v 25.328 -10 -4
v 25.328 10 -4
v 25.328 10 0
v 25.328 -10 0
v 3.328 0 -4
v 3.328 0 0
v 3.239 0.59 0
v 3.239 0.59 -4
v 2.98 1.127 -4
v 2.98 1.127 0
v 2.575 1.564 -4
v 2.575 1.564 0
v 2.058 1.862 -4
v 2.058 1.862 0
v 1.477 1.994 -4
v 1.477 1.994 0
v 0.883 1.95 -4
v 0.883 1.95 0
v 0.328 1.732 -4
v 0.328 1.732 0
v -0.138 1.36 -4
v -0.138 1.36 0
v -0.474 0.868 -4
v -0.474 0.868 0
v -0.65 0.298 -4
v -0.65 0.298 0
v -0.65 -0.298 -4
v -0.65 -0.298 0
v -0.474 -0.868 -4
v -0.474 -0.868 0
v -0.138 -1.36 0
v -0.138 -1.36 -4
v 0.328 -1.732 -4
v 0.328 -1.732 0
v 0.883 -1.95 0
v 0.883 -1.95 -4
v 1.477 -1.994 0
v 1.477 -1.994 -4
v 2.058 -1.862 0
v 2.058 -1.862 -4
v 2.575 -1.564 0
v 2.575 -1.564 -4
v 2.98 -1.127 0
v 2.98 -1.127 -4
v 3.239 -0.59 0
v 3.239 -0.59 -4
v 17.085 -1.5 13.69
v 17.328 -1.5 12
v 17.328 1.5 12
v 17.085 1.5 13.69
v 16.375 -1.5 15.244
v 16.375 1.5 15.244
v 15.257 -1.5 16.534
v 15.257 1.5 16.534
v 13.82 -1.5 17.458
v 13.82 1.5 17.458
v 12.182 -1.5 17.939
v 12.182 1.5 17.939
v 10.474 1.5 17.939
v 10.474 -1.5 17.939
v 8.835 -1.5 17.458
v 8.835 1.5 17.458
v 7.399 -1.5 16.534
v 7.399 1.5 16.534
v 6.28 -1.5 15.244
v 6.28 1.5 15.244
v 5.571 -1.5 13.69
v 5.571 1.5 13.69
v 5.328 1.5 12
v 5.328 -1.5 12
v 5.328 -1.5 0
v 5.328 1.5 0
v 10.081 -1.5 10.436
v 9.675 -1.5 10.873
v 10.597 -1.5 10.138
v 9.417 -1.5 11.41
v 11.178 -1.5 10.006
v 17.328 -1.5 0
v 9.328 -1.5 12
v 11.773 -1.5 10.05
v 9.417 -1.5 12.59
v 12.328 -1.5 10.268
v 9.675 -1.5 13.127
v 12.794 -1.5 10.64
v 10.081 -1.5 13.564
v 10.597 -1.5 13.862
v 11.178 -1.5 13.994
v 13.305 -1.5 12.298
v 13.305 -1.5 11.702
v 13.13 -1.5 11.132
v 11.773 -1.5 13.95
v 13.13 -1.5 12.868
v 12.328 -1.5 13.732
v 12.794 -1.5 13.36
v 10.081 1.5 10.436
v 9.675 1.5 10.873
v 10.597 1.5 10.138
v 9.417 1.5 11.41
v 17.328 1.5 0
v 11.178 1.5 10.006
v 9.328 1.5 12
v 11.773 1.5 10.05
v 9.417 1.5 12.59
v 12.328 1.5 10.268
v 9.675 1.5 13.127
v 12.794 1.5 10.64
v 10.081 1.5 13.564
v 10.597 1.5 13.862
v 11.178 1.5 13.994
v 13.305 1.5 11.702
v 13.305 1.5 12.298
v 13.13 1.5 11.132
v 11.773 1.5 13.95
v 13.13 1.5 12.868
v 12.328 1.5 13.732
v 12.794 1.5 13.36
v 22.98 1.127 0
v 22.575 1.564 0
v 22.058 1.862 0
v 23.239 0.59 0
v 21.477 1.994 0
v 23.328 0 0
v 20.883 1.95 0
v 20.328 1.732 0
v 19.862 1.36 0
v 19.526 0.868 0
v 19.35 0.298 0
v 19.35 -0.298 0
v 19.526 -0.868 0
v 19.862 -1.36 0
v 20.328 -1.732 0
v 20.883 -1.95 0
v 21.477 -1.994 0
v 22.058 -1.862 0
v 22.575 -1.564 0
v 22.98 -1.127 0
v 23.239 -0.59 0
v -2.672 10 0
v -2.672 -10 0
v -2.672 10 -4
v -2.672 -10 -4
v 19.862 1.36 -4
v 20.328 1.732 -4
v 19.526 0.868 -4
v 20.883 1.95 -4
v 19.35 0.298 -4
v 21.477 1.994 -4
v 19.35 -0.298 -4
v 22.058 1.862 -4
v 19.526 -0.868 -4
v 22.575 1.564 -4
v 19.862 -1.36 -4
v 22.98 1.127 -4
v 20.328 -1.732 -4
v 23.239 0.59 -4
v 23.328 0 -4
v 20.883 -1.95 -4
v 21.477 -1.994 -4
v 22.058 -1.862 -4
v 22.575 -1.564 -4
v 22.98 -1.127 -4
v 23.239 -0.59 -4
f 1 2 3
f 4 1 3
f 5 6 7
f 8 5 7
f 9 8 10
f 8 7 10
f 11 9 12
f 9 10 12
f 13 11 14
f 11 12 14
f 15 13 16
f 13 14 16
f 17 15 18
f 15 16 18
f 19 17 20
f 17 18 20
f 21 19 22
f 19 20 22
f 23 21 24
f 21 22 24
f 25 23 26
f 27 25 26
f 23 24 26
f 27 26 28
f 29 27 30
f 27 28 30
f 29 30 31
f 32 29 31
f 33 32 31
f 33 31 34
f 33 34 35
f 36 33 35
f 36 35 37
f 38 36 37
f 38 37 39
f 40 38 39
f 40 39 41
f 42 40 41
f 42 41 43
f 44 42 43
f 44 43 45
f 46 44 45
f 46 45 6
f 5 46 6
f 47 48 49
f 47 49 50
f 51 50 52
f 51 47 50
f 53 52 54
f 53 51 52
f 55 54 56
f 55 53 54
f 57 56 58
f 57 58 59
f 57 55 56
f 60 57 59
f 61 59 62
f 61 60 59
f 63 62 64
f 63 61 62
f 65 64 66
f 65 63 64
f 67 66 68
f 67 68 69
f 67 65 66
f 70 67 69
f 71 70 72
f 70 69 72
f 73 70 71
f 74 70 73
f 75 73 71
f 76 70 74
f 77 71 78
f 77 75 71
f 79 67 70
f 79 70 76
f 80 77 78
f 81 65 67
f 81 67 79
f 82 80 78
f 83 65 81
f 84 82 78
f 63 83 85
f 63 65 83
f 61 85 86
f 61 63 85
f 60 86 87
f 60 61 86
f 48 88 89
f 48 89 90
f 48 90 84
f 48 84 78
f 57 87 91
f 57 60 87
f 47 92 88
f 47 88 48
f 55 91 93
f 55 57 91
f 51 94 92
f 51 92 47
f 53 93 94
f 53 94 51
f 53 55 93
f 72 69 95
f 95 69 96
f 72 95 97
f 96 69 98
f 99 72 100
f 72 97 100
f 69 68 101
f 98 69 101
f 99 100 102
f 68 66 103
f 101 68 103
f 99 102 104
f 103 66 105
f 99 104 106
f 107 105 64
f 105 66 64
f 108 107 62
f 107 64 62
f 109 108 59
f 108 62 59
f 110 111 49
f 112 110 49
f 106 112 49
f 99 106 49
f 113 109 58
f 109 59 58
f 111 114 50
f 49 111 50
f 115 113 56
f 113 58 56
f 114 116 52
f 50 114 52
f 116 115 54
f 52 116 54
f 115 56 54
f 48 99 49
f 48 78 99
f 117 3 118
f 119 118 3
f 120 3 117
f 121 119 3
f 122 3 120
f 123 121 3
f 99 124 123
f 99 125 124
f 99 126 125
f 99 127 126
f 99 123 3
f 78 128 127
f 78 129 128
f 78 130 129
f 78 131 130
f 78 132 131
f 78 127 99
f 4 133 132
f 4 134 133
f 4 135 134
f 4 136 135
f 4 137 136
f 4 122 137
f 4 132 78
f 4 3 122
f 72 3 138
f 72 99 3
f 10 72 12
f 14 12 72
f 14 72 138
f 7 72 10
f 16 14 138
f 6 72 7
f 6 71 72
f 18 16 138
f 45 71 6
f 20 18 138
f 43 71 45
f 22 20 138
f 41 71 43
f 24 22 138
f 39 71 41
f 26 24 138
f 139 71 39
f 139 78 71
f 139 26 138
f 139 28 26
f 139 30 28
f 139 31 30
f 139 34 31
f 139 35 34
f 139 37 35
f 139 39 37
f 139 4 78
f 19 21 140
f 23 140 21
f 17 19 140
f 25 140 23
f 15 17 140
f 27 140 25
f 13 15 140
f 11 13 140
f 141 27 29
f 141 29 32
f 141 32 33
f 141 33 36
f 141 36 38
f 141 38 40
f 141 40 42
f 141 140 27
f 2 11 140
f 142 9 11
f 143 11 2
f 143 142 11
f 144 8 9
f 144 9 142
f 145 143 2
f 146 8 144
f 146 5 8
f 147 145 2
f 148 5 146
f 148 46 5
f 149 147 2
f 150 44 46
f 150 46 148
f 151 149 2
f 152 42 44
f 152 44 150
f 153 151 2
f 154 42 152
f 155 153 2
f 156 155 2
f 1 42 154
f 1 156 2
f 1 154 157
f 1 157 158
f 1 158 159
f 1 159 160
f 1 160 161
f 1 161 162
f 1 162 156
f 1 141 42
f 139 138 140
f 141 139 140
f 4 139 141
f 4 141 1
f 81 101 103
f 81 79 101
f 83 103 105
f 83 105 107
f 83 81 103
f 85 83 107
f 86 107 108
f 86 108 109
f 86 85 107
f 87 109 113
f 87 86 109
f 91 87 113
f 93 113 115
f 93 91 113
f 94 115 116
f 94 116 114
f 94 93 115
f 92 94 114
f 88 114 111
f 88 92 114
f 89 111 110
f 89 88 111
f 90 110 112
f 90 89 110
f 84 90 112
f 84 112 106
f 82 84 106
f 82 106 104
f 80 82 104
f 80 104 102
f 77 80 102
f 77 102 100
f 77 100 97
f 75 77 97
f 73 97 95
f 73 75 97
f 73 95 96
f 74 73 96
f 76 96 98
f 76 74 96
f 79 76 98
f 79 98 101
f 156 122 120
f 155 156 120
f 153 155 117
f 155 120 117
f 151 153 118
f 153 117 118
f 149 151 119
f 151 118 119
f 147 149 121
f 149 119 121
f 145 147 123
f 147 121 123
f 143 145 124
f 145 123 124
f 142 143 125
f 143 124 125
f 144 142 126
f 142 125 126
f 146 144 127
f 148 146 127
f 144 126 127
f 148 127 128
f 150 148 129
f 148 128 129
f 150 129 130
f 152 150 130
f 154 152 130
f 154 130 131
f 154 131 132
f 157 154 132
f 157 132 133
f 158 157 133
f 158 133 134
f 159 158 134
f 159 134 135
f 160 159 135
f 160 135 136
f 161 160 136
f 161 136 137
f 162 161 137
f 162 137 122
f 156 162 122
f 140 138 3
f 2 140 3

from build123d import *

# Parameters (mm, degrees)
F1_DEPTH      = 10
F1_DEPTH_BACK = 10
F2_DEPTH      = 1.5
F2_DEPTH_BACK = 1.5
F3_R          = 2
F4_DEPTH      = 5
F4_DEPTH_BACK = 5


with BuildPart() as f1:
    # F0 (on Front) → F1 (new body, two sides)
    with BuildSketch(Plane.XZ) as f1_sk:
        Polygon((25.327755, 0), (17.327755, 0), (5.327755, 0), (-2.672245, 0), (-2.672245, -4), (25.327755, -4), align=None)
    extrude(amount=F1_DEPTH)
    extrude(f1_sk.sketch, amount=-F1_DEPTH_BACK)

    # F0 (on Front) → F2 (join, two sides)
    with BuildSketch(Plane.XZ) as f2_sk:
        with BuildLine():
            Line((5.327755, 0), (17.327755, 0))
            Line((17.327755, 0), (17.327755, 12))
            ThreePointArc((17.327755, 12), (11.327755, 6), (5.327755, 12))
            Line((5.327755, 12), (5.327755, 0))
        make_face()
        with BuildLine():
            ThreePointArc((5.327755, 12), (11.327755, 6), (17.327755, 12))
            Line((17.327755, 12), (13.327755, 12))
            ThreePointArc((13.327755, 12), (11.327755, 10), (9.327755, 12))
            Line((9.327755, 12), (5.327755, 12))
        make_face()
        with BuildLine():
            Line((13.327755, 12), (17.327755, 12))
            ThreePointArc((17.327755, 12), (11.327755, 18), (5.327755, 12))
            Line((5.327755, 12), (9.327755, 12))
            ThreePointArc((9.327755, 12), (11.327755, 14), (13.327755, 12))
        make_face()
    extrude(amount=F2_DEPTH)
    extrude(f2_sk.sketch, amount=-F2_DEPTH_BACK)

    # F3 (on face) → F4 (cut, two sides)
    with BuildSketch(Plane.XY) as f4_sk:
        with Locations((1.327755, 0)):
            Circle(F3_R)
        with Locations((21.327755, 0)):
            Circle(F3_R)
    extrude(amount=-F4_DEPTH, mode=Mode.SUBTRACT)
    extrude(f4_sk.sketch, amount=-F4_DEPTH_BACK, mode=Mode.SUBTRACT)


solid = f1.part
